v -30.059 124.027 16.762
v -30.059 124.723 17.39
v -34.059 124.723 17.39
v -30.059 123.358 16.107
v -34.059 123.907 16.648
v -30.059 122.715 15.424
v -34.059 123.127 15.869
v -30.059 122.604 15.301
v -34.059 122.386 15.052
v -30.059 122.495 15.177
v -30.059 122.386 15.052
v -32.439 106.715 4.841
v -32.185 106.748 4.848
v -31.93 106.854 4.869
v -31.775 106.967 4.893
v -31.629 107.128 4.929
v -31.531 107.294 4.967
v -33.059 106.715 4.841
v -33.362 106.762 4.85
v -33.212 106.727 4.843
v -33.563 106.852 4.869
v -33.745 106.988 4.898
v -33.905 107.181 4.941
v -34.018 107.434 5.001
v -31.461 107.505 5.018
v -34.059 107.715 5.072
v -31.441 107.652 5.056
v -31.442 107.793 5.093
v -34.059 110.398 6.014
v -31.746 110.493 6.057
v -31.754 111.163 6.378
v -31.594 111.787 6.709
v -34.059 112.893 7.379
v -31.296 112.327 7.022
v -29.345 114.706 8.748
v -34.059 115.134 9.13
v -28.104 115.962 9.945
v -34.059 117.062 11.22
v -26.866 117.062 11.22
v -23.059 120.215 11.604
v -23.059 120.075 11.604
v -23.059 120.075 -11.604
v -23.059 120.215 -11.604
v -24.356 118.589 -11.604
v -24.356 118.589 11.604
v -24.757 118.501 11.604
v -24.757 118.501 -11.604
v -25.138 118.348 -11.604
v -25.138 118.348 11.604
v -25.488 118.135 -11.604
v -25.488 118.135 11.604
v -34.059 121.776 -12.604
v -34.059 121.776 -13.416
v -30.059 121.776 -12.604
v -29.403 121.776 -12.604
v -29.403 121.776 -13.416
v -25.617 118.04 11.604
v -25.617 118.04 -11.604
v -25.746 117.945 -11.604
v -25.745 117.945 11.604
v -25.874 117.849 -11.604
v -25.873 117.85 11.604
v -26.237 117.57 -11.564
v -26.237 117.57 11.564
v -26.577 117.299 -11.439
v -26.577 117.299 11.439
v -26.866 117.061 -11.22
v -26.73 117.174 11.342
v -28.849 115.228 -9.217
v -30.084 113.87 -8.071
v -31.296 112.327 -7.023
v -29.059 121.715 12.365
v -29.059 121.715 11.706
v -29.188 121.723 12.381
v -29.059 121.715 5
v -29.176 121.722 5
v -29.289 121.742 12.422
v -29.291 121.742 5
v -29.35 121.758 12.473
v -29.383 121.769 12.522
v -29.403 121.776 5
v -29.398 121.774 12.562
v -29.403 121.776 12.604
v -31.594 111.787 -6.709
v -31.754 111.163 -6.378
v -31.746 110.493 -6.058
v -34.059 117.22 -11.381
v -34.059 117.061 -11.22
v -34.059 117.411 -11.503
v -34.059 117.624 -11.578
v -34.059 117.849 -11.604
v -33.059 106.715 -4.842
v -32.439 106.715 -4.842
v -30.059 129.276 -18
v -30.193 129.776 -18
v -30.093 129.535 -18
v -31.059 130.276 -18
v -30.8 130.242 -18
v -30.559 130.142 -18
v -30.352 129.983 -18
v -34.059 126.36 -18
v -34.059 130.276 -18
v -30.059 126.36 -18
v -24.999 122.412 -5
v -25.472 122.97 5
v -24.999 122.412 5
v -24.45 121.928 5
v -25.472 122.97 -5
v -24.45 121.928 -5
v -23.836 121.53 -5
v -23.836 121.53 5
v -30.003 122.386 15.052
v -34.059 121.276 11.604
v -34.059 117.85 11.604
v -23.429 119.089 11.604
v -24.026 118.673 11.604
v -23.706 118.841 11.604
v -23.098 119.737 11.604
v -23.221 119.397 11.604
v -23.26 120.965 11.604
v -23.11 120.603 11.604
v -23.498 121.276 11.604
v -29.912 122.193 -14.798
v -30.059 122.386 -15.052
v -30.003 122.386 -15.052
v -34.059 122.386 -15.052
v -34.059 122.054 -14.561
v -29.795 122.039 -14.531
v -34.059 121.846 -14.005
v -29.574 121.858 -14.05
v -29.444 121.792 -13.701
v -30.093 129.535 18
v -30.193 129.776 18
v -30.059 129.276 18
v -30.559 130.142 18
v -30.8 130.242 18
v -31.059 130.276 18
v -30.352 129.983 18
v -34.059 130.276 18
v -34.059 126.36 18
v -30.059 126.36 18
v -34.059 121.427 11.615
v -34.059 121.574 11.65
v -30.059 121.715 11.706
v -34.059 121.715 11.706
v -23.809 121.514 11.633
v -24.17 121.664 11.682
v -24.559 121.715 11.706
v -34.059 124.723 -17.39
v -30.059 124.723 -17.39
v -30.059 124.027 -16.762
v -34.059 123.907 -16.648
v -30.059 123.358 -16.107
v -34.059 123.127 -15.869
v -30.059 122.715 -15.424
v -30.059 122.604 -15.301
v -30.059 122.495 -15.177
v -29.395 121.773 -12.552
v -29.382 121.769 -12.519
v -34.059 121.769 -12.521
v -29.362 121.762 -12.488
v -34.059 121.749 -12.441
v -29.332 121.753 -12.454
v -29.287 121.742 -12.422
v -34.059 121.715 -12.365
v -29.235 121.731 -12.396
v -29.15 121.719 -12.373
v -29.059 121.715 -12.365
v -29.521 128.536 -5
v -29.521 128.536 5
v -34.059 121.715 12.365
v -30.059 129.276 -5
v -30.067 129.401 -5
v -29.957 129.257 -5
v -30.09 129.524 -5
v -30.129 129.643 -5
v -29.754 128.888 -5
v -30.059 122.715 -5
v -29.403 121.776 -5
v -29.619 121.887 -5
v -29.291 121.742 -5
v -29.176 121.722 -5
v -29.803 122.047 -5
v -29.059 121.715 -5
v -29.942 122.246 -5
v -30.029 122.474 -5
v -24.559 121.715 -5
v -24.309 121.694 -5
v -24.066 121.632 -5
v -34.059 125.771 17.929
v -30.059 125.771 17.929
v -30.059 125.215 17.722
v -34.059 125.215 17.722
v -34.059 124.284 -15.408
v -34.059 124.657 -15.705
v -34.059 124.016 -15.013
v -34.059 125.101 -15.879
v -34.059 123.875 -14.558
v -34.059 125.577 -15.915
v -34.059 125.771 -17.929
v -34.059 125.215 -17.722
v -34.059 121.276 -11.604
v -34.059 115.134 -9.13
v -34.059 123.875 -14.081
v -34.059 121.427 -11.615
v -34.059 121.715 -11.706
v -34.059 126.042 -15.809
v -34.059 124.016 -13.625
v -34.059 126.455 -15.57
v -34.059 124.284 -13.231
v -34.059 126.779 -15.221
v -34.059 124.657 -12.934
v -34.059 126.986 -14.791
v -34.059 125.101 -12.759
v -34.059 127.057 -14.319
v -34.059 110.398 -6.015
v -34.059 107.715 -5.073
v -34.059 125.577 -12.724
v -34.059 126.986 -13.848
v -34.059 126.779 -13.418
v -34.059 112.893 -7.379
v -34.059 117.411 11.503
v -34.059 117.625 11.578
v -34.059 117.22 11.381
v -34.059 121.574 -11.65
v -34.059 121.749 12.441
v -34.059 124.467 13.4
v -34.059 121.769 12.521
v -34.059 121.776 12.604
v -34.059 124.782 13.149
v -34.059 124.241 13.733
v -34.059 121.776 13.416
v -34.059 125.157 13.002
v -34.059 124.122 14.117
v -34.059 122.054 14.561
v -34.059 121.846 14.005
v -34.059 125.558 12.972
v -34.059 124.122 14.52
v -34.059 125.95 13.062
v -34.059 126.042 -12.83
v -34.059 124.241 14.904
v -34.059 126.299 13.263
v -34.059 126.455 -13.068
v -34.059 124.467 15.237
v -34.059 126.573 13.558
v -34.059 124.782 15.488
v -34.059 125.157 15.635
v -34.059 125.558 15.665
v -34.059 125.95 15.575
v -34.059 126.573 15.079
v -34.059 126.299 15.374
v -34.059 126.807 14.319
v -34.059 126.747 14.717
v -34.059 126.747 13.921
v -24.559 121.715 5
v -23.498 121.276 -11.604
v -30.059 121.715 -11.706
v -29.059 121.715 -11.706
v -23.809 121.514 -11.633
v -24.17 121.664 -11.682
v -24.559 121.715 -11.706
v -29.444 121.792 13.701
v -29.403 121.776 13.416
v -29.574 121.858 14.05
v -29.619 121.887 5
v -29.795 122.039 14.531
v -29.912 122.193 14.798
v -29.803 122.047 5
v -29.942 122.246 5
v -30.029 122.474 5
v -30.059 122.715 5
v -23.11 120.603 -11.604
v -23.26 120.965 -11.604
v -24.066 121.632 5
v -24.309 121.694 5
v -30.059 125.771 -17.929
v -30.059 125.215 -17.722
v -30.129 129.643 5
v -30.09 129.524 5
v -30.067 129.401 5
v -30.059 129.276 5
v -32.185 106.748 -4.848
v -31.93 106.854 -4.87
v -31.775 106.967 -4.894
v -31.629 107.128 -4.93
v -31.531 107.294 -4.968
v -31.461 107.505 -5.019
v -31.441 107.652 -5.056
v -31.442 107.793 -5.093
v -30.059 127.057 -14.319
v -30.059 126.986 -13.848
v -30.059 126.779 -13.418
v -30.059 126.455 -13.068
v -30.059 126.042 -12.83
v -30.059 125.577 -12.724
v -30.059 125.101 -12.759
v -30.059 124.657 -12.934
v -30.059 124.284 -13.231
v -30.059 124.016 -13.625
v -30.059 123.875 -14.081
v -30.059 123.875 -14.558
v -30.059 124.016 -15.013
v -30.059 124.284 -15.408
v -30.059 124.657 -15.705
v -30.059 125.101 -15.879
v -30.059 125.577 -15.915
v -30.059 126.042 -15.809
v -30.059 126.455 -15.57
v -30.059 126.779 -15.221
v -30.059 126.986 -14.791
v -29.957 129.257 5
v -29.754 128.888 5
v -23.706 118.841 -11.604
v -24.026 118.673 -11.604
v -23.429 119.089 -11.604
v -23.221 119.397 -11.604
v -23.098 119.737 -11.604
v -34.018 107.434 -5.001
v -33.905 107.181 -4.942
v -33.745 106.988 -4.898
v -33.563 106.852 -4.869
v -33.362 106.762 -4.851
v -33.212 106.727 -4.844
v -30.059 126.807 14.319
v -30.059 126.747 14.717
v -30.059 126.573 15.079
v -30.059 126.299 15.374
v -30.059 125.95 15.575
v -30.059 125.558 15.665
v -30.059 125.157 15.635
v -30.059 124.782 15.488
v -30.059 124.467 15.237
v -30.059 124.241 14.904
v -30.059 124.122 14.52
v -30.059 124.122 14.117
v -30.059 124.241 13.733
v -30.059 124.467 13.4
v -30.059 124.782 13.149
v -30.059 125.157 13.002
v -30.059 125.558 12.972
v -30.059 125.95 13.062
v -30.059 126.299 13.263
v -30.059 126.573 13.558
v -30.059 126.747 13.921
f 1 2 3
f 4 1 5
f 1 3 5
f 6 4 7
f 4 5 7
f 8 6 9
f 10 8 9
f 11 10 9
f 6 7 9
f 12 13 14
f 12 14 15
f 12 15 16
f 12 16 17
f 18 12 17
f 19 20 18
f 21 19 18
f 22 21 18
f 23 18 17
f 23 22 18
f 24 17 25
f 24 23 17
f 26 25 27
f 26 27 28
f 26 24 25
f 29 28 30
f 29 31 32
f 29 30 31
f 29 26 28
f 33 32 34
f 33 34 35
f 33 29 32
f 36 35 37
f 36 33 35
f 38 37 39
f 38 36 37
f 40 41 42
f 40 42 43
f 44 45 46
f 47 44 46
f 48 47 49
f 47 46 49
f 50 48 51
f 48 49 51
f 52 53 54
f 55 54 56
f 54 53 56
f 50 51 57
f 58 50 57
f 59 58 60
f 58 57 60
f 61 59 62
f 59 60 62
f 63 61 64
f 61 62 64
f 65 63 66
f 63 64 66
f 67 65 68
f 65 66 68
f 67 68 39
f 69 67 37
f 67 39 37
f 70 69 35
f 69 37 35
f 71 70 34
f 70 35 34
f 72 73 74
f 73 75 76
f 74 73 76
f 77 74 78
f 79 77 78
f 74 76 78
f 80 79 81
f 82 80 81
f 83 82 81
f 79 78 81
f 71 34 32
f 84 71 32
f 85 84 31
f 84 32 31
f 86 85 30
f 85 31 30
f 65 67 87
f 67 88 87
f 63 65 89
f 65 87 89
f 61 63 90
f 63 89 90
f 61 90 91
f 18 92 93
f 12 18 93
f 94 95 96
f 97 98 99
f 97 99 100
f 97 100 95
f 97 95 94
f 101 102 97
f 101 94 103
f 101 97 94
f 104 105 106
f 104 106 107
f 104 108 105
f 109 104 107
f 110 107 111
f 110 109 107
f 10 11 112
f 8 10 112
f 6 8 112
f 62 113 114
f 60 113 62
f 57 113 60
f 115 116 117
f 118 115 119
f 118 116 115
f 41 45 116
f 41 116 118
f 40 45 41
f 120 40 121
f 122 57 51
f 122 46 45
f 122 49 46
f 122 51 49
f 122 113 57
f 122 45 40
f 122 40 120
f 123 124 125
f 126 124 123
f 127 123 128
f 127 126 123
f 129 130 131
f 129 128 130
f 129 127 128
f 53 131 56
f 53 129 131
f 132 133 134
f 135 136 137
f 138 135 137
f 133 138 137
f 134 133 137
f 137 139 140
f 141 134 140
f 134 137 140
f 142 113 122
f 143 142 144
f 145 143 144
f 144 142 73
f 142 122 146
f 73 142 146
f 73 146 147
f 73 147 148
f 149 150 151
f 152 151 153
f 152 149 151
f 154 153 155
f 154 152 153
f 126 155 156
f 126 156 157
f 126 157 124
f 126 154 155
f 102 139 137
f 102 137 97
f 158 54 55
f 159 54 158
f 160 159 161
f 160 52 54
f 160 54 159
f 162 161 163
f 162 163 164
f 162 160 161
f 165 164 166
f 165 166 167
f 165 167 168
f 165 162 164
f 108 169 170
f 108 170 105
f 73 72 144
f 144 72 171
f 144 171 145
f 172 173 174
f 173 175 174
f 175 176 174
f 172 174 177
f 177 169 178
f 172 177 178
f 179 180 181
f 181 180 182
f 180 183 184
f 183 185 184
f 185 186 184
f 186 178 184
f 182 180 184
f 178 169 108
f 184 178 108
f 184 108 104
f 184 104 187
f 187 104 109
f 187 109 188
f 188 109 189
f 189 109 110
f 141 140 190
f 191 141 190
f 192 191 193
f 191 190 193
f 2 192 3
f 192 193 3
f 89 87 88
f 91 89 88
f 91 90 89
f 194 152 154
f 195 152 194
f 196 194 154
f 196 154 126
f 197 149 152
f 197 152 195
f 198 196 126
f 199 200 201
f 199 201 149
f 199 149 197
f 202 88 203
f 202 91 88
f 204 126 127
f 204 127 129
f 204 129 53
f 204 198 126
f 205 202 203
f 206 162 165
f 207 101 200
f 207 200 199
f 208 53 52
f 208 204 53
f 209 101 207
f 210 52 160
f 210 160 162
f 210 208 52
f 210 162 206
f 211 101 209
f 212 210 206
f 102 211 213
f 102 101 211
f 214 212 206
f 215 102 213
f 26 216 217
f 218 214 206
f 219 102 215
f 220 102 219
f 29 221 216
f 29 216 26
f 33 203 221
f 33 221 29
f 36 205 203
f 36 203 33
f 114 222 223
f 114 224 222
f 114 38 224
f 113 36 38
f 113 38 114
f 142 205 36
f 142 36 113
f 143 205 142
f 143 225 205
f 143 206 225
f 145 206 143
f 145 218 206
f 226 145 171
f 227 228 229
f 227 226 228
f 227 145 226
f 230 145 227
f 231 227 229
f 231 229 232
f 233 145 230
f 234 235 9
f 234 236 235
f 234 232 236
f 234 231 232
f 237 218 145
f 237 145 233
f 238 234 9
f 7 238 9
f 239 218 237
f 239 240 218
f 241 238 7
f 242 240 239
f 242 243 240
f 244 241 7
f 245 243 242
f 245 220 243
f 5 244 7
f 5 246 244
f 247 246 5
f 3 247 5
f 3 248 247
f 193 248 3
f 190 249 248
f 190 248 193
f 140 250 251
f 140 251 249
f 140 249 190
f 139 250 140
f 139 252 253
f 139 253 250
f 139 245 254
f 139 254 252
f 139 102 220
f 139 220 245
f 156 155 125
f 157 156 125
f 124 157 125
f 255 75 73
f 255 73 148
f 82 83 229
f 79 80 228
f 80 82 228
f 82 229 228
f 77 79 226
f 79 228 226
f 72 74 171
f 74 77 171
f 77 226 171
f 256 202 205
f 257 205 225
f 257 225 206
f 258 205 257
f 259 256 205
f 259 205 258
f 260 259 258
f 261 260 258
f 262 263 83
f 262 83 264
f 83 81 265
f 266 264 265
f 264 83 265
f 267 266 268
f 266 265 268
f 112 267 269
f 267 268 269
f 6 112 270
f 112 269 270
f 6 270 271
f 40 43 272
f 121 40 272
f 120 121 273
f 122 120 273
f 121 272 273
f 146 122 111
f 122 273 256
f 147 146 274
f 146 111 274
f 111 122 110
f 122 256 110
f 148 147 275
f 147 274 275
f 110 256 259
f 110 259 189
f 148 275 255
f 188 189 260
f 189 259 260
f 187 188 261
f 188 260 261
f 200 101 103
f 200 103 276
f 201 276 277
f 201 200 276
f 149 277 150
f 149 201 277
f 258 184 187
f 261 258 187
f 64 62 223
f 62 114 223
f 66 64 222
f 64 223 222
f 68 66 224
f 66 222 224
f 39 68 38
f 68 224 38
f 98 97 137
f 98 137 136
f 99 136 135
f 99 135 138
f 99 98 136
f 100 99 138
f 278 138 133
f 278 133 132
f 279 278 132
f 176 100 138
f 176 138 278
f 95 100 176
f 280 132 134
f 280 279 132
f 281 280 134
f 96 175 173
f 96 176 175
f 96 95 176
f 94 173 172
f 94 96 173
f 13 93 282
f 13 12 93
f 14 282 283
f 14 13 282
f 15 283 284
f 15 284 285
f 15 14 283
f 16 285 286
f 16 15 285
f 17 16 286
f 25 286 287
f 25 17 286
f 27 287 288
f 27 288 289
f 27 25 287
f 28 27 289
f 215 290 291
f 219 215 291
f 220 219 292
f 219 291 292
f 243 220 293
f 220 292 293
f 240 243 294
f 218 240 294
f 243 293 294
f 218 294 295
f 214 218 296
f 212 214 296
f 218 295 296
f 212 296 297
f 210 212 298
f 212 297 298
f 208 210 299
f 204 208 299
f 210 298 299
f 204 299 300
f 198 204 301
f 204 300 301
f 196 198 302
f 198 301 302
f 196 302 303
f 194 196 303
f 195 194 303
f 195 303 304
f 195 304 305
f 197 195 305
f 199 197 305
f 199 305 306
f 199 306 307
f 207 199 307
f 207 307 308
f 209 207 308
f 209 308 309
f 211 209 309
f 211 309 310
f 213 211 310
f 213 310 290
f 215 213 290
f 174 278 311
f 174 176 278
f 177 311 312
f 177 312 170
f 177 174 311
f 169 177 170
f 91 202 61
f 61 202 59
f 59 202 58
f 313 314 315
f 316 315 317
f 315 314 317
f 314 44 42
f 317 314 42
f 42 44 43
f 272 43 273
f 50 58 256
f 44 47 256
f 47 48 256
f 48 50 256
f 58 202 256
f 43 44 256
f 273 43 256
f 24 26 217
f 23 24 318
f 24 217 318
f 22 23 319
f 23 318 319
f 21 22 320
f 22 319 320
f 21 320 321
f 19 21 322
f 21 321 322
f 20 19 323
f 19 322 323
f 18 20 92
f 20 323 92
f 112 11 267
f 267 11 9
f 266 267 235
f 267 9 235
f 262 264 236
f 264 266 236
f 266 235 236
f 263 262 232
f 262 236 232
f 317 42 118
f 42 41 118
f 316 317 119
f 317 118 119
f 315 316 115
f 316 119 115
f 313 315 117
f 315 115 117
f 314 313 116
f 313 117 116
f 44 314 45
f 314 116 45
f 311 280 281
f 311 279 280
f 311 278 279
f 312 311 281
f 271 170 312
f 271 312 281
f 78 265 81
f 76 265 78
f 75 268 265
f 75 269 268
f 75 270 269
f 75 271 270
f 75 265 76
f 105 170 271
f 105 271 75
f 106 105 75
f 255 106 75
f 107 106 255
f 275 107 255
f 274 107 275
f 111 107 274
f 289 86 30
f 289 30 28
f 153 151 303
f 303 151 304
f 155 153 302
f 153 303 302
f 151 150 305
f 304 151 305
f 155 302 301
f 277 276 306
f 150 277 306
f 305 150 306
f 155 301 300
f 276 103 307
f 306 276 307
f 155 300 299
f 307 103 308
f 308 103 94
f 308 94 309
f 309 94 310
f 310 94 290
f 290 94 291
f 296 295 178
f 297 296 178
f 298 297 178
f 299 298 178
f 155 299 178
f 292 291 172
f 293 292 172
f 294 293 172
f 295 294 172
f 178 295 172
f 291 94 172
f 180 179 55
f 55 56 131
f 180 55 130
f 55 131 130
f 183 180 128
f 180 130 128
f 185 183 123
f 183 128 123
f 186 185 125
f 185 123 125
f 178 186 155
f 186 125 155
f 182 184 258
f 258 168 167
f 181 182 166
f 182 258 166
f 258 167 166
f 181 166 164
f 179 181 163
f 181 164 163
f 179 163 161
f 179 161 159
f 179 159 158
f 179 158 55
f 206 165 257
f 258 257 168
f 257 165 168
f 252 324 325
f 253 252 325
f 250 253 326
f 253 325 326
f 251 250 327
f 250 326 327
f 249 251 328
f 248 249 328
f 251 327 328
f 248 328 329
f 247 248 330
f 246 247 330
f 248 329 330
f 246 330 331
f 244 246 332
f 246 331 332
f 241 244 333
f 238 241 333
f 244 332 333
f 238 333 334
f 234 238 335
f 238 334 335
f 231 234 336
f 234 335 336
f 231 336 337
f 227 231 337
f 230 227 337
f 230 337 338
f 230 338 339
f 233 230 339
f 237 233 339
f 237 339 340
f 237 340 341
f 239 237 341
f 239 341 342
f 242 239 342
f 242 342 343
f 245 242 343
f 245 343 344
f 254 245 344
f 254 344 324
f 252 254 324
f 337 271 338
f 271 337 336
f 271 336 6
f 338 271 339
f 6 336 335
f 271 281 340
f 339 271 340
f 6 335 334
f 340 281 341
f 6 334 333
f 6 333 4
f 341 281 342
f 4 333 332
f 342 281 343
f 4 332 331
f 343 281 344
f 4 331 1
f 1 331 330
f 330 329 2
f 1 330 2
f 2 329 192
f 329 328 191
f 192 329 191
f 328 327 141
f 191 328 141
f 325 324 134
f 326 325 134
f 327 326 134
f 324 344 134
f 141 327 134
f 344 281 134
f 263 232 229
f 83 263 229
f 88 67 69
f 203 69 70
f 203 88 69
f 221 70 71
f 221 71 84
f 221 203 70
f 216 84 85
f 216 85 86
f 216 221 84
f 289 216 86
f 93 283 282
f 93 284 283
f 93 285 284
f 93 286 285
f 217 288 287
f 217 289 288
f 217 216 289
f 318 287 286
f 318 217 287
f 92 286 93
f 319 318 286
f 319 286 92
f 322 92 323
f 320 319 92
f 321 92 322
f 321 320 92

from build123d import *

# Parameters (mm, degrees)
EXTRUDE_1_DEPTH          = 4
EXTRUDE_START            = -4
SKETCH_3_W               = 23.208015554
SKETCH_3_H               = 15.560947598
EXTRUDE_2_DEPTH          = 4
SKETCH_7_W               = 7
SKETCH_7_H               = 15
EXTRUDE_3_DEPTH          = 23.208015554
CUT_EXTRUDE_6_DEPTH      = 25
SKETCH_5_R               = 1.35
SKETCH_5_R_2             = 1.6
CUT_EXTRUDE_2_DEPTH      = 41
FILLET_1_R               = 1
CUT_EXTRUDE_9_DEPTH      = 132.632440775
CUT_EXTRUDE_9_DEPTH_BACK = 132.632440775
SKETCH_16_R              = 17.5
EXTRUDE_5_DEPTH          = 4
FILLET_8_R               = 1
FILLET_10_R              = 1
FILLET_12_R              = 1
FILLET_13_R              = 1.5
RIB_1_REACH              = 137.852
SKETCH_19_WALL_W         = 283.05422189
SKETCH_19_WALL_H         = 10
FILLET_START             = -15.424467696
FILLET_14_DEPTH          = 30.848935392
FILLET_START_2           = -12.604007877
FILLET_14_2_DEPTH        = 25.208015654
FILLET_START_3           = -30.058809371
FILLET_14_3_DEPTH        = 2.058809371
FILLET_15_R              = 5


with BuildPart() as part:
    # 草图2 → 凸台-拉伸1 (new body)
    with BuildSketch(Plane(origin=(-34.058809371, 0, 0), x_dir=(0, 0, -1), z_dir=(1, 0, 0))):
        with BuildLine():
            Line((17.500319827, 130.276008038), (17.500319827, 126.359600173))
            ThreePointArc((17.500319827, 126.359600173), (17.374404969, 125.661169877), (17.012514948, 125.050682332))
            ThreePointArc((17.012514948, 125.050682332), (15.910222403, 123.866105461), (14.725645532, 122.763812916))
            ThreePointArc((14.725645532, 122.763812916), (14.115157987, 122.401922895), (13.416727692, 122.276008038))
            Line((13.416727692, 122.276008038), (8.570604361, 122.276008038))
            Line((8.570604361, 122.276008038), (-4.829395639, 122.276008038))
            Line((-4.829395639, 122.276008038), (-13.416088038, 122.276008038))
            ThreePointArc((-13.416088038, 122.276008038), (-14.114518334, 122.401922895), (-14.725005879, 122.763812916))
            ThreePointArc((-14.725005879, 122.763812916), (-15.90958275, 123.866105461), (-17.011875295, 125.050682332))
            ThreePointArc((-17.011875295, 125.050682332), (-17.373765316, 125.661169877), (-17.499680173, 126.359600173))
            Line((-17.499680173, 126.359600173), (-17.499680173, 130.276008038))
            Line((-17.499680173, 130.276008038), (17.500319827, 130.276008038))
        make_face()
    extrude(amount=EXTRUDE_1_DEPTH)

    # 草图3 → 凸台-拉伸2 (add)
    with BuildSketch(Plane(origin=(-30.058809371, 0, 0), x_dir=(0, 0, -1), z_dir=(1, 0, 0)).offset(EXTRUDE_START)):
        with Locations((0, 114.495534239)):
            Rectangle(SKETCH_3_W, SKETCH_3_H)
    extrude(amount=EXTRUDE_2_DEPTH)

    # 草图7 → 凸台-拉伸3 (add)
    with BuildSketch(Plane.XY.offset(11.604007777)):
        with Locations((-26.558809371, 114.21506044)):
            Rectangle(SKETCH_7_W, SKETCH_7_H)
    extrude(amount=-EXTRUDE_3_DEPTH)

    # 草图11 → 切除-拉伸6 (cut)
    with BuildSketch(Plane.XY.offset(11.604007777)):
        with BuildLine():
            Line((-17.260737948, 105.57071884), (-17.822335609, 118.157865003))
            ThreePointArc((-17.822335609, 118.157865003), (-20.746096987, 118.264862867), (-23.654216554, 118.585284033))
            ThreePointArc((-23.654216554, 118.585284033), (-24.615393694, 118.539747196), (-25.488172243, 118.134540208))
            ThreePointArc((-25.488172243, 118.134540208), (-28.620362377, 115.459397112), (-31.295505473, 112.327206978))
            ThreePointArc((-31.295505473, 112.327206978), (-31.700712461, 111.454428429), (-31.746249298, 110.493251289))
            ThreePointArc((-31.746249298, 110.493251289), (-31.523200675, 108.69967015), (-31.381401894, 106.897844106))
            ThreePointArc((-31.381401894, 106.897844106), (-31.32637065, 105.4380129), (-31.324682737, 103.977145782))
            Line((-31.324682737, 103.977145782), (-17.260737948, 105.57071884))
        make_face()
    extrude(amount=-CUT_EXTRUDE_6_DEPTH, mode=Mode.SUBTRACT)

    # 草图5 → 切除-拉伸2 (cut)
    with BuildSketch(Plane(origin=(-30.058809371, 0, 0), x_dir=(0, 0, -1), z_dir=(1, 0, 0))):
        with Locations(Location((-14.318592493, 125.457095719, 0), (0, 0, 90))):
            Circle(SKETCH_5_R)
        with Locations(Location((14.319232146, 125.457095719, 0), (0, 0, 90))):
            Circle(SKETCH_5_R_2)
    extrude(amount=-CUT_EXTRUDE_2_DEPTH, mode=Mode.SUBTRACT)

    # 圆角1
    fillet_1_edges = [part.edges().sort_by_distance(p)[0] for p in [
        (-32.058809371, 122.276008038, -11.604007777),
    ]]
    fillet(fillet_1_edges, radius=FILLET_1_R)
    fillet_1_2_edges = [part.edges().sort_by_distance(p)[0] for p in [
        (-32.058809371, 122.276008038, 11.604007777),
    ]]
    fillet(fillet_1_2_edges, radius=FILLET_1_R)

    # 草图16 → 切除-拉伸9 (cut, two sides: drawn at the far end of the back side and taken through both)
    with BuildSketch(Plane(origin=(-30.058809371, 0, 0), x_dir=(0, 0, -1), z_dir=(1, 0, 0)).offset(-CUT_EXTRUDE_9_DEPTH_BACK)):
        with Locations((22.000319827, 103.276008038)):
            Circle(SKETCH_16_R)
        with Locations((-21.999680173, 103.276008038)):
            Circle(SKETCH_16_R)
    extrude(amount=CUT_EXTRUDE_9_DEPTH + CUT_EXTRUDE_9_DEPTH_BACK, mode=Mode.SUBTRACT)

    # 草图17 → 凸台-拉伸5 (add)
    with BuildSketch(Plane(origin=(-30.058809371, 0, 0), x_dir=(0, 0, -1), z_dir=(1, 0, 0)).offset(EXTRUDE_START)):
        with BuildLine():
            Line((-12.604007777, 122.276008038), (-13.416088038, 122.276008038))
            ThreePointArc((-13.416088038, 122.276008038), (-14.114518334, 122.401922895), (-14.725005879, 122.763812916))
            ThreePointArc((-14.725005879, 122.763812916), (-15.90958275, 123.866105461), (-17.011875295, 125.050682332))
            ThreePointArc((-17.011875295, 125.050682332), (-17.373765316, 125.661169877), (-17.499680173, 126.359600173))
            Line((-17.499680173, 126.359600173), (-17.499680173, 130.276008038))
            Line((-17.499680173, 130.276008038), (-17.999680173, 130.276008038))
            Line((-17.999680173, 130.276008038), (-17.999680173, 129.776008038))
            Line((-17.999680173, 129.776008038), (-17.999680173, 126.359600173))
            ThreePointArc((-17.999680173, 126.359600173), (-17.842286602, 125.486562303), (-17.389924076, 124.723452872))
            ThreePointArc((-17.389924076, 124.723452872), (-16.263136141, 123.512552071), (-15.052235339, 122.385764135))
            ThreePointArc((-15.052235339, 122.385764135), (-14.289125908, 121.93340161), (-13.416088038, 121.776008038))
            Line((-13.416088038, 121.776008038), (-12.604007777, 121.776008038))
            ThreePointArc((-12.604007777, 121.776008038), (-12.48056994, 121.760531619), (-12.364773606, 121.71506044))
            Line((-12.364773606, 121.71506044), (-11.705546321, 121.71506044))
            ThreePointArc((-11.705546321, 121.71506044), (-12.074410006, 122.124256941), (-12.604007777, 122.276008038))
        make_face()
    extrude_5 = extrude(amount=EXTRUDE_5_DEPTH)

    # 镜向1: 凸台-拉伸5 across plane
    add(extrude_5.mirror(Plane.XY))

    # 圆角8
    fillet_8_edges = [part.edges().sort_by_distance(p)[0] for p in [
        (-30.284407251, 117.353177347, -11.604007777),
        (-30.284113568, 117.353649723, 11.604007777),
    ]]
    fillet(fillet_8_edges, radius=FILLET_8_R)

    # 圆角10
    fillet_10_edges = [part.edges().sort_by_distance(p)[0] for p in [
        (-30.058809371, 130.276008038, 0),
    ]]
    fillet(fillet_10_edges, radius=FILLET_10_R)

    # 圆角12
    fillet_12_edges = [part.edges().sort_by_distance(p)[0] for p in [
        (-31.371585595, 106.71506044, -0.000319827),
        (-34.058809371, 106.71506044, -0.000319827),
    ]]
    fillet(fillet_12_edges, radius=FILLET_12_R)

    # 圆角13
    fillet_13_edges = [part.edges().sort_by_distance(p)[0] for p in [
        (-23.058809371, 121.71506044, 0),
        (-23.058809371, 118.502104481, 0),
    ]]
    fillet(fillet_13_edges, radius=FILLET_13_R)

    # 草图19 wall → 筋1 (add, up to next)
    with BuildSketch(Plane(origin=(-27.308809371, 125.495534239, 0), x_dir=(0.588250674462, -0.808678640744, 0), z_dir=(0.808678640744, 0.588250674462, 0)), mode=Mode.PRIVATE) as rib_1_sk1:
        Rectangle(SKETCH_19_WALL_W, SKETCH_19_WALL_H)
    rib_1_tool1 = extrude(rib_1_sk1.sketch, amount=-RIB_1_REACH, mode=Mode.PRIVATE) - part.part
    add(rib_1_tool1.solids().sort_by_distance((-27.308809371, 125.495534239, 0))[0])

    # 圆角14: read off the stored shape, not the designer's step
    # 圆角14 outline → 圆角14 (add)
    with BuildSketch(Plane.XY.offset(FILLET_START)):
        with BuildLine():
            Line((-30.058809371, 121.776008038), (-29.402583406, 121.776008038))
            ThreePointArc((-29.402583406, 121.776008038), (-29.878496517, 122.142248968), (-30.058809371, 122.71506044))
            Line((-30.058809371, 122.71506044), (-30.058809371, 121.776008038))
        make_face()
    extrude(amount=FILLET_14_DEPTH)

    # Fillet 14 2 outline → Fillet 14 2 (add)
    with BuildSketch(Plane.XY.offset(FILLET_START_2)):
        with BuildLine():
            Line((-30.058809371, 121.71506044), (-29.058809371, 121.71506044))
            ThreePointArc((-29.058809371, 121.71506044), (-29.233376834, 121.730415224), (-29.402583406, 121.776008038))
            Line((-29.402583406, 121.776008038), (-30.058809371, 121.776008038))
            Line((-30.058809371, 121.776008038), (-30.058809371, 121.71506044))
        make_face()
    extrude(amount=FILLET_14_2_DEPTH)

    # Fillet 14 3 outline → Fillet 14 3 (cut)
    with BuildSketch(Plane.YZ.offset(FILLET_START_3)):
        with BuildLine():
            ThreePointArc((121.71506044, 12.364773606), (121.760531619, 12.48056994), (121.776008038, 12.604007777))
            Line((121.776008038, 12.604007777), (121.71506044, 12.604007777))
            Line((121.71506044, 12.604007777), (121.71506044, 12.364773606))
        make_face()
        with BuildLine():
            ThreePointArc((121.776008038, 13.416088038), (121.93340161, 14.289125908), (122.385764135, 15.052235339))
            ThreePointArc((122.385764135, 15.052235339), (122.549406884, 15.23924095), (122.715060489, 15.424467652))
            Line((122.715060489, 15.424467652), (121.776008038, 15.424467696))
            Line((121.776008038, 15.424467696), (121.776008038, 13.416088038))
        make_face()
        with BuildLine():
            ThreePointArc((122.385764135, -15.052235339), (121.93340161, -14.289125908), (121.776008038, -13.416088038))
            Line((121.776008038, -13.416088038), (121.776008038, -15.424467696))
            Line((121.776008038, -15.424467696), (122.715060489, -15.424467652))
            ThreePointArc((122.715060489, -15.424467652), (122.549406884, -15.23924095), (122.385764135, -15.052235339))
        make_face()
        with BuildLine():
            Line((121.71506044, -12.604007877), (121.776008038, -12.604007777))
            ThreePointArc((121.776008038, -12.604007777), (121.760531619, -12.48056994), (121.71506044, -12.364773606))
            Line((121.71506044, -12.364773606), (121.71506044, -12.604007877))
        make_face()
    extrude(amount=FILLET_14_3_DEPTH, mode=Mode.SUBTRACT)

    # 圆角15
    fillet_15_edges = [part.edges().sort_by_distance(p)[0] for p in [
        (-30.058809371, 129.276008038, 0),
        (-24.558809371, 121.71506044, 0),
    ]]
    fillet(fillet_15_edges, radius=FILLET_15_R)


solid = part.part
